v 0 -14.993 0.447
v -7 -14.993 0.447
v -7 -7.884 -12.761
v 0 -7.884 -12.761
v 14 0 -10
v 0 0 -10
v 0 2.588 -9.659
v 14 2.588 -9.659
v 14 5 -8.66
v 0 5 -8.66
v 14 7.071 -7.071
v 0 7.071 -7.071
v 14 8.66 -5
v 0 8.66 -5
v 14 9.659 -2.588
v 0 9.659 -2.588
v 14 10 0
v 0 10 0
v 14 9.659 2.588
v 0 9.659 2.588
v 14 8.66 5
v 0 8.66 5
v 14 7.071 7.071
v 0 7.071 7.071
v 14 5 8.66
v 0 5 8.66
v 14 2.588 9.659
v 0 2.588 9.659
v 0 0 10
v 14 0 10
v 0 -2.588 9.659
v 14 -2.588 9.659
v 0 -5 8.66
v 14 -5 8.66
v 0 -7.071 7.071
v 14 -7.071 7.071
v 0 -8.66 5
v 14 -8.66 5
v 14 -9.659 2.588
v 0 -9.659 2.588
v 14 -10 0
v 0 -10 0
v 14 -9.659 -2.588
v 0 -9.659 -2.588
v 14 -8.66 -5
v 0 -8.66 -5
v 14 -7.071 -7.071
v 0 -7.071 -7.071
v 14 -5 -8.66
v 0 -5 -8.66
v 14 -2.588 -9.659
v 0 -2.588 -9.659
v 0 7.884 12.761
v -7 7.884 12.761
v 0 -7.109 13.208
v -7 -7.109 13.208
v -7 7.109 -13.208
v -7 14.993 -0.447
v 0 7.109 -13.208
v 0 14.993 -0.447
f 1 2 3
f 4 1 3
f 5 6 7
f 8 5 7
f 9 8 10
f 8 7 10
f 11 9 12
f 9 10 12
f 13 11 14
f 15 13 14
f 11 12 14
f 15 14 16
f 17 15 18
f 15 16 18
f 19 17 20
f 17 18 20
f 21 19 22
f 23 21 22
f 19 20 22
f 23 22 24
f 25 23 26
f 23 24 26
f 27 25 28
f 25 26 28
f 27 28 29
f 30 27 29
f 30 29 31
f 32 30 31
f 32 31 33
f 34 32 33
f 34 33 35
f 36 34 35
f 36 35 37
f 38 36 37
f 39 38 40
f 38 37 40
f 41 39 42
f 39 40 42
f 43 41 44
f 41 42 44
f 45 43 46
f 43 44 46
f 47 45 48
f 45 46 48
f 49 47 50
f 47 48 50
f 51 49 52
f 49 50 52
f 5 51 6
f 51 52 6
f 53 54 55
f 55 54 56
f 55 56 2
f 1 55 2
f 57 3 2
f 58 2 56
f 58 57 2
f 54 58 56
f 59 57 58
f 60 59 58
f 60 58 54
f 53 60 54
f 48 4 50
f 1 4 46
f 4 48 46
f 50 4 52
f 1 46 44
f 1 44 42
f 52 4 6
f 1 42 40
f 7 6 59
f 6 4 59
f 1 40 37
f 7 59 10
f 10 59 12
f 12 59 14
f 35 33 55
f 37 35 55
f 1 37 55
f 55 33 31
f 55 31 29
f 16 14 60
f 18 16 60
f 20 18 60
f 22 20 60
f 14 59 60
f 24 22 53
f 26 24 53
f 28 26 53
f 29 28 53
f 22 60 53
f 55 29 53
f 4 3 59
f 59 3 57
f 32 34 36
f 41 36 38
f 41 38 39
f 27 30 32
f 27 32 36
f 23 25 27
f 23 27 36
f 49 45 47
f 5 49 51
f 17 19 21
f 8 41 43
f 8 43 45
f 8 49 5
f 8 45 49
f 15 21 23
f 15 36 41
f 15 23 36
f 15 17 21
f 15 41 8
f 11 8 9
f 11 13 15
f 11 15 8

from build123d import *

# Parameters (mm, degrees)
CROQUIS1_R              = 10
SALIENTE_EXTRUIR1_DEPTH = 14
CROQUIS2_R              = 15
SALIENTE_EXTRUIR2_DEPTH = 7
CORTAR_EXTRUIR1_DEPTH   = 30.849623113


with BuildPart() as part:
    # Croquis1 → Saliente-Extruir1 (new body)
    with BuildSketch(Plane(origin=(0, 0, 0), x_dir=(0, 0, -1), z_dir=(1, 0, 0))):
        Circle(CROQUIS1_R)
    extrude(amount=SALIENTE_EXTRUIR1_DEPTH)

    # Croquis2 → Saliente-Extruir2 (add)
    with BuildSketch(Plane.ZY):
        Circle(CROQUIS2_R)
    extrude(amount=SALIENTE_EXTRUIR2_DEPTH)

    # Croquis5 → Cortar-Extruir1 (cut, through all)
    with BuildSketch(Plane.ZY.offset(7)):
        with BuildLine():
            Line((-13.208306062, 7.109194819), (-0.447409717, 14.993326))
            ThreePointArc((-0.447409717, 14.993326), (-7.884131181, 12.760896345), (-13.208306062, 7.109194819))
        make_face()
        with BuildLine():
            Line((-12.760896345, -7.884131181), (-13.208306062, 7.109194819))
            ThreePointArc((-13.208306062, 7.109194819), (-14.993326, -0.447409717), (-12.760896345, -7.884131181))
        make_face()
        with BuildLine():
            Line((0.447409717, -14.993326), (-12.760896345, -7.884131181))
            ThreePointArc((-12.760896345, -7.884131181), (-7.109194819, -13.208306062), (0.447409717, -14.993326))
        make_face()
        with BuildLine():
            ThreePointArc((0.447409717, -14.993326), (7.884131181, -12.760896345), (13.208306062, -7.109194819))
            Line((13.208306062, -7.109194819), (0.447409717, -14.993326))
        make_face()
        with BuildLine():
            ThreePointArc((15, 0), (14.429370138, 4.097960153), (12.760896345, 7.884131181))
            Line((12.760896345, 7.884131181), (13.208306062, -7.109194819))
            ThreePointArc((13.208306062, -7.109194819), (14.545181177, -3.665747473), (15, 0))
        make_face()
        with BuildLine():
            ThreePointArc((12.760896345, 7.884131181), (7.109194819, 13.208306062), (-0.447409717, 14.993326))
            Line((-0.447409717, 14.993326), (12.760896345, 7.884131181))
        make_face()
    extrude(amount=-CORTAR_EXTRUIR1_DEPTH, mode=Mode.SUBTRACT)


solid = part.part
